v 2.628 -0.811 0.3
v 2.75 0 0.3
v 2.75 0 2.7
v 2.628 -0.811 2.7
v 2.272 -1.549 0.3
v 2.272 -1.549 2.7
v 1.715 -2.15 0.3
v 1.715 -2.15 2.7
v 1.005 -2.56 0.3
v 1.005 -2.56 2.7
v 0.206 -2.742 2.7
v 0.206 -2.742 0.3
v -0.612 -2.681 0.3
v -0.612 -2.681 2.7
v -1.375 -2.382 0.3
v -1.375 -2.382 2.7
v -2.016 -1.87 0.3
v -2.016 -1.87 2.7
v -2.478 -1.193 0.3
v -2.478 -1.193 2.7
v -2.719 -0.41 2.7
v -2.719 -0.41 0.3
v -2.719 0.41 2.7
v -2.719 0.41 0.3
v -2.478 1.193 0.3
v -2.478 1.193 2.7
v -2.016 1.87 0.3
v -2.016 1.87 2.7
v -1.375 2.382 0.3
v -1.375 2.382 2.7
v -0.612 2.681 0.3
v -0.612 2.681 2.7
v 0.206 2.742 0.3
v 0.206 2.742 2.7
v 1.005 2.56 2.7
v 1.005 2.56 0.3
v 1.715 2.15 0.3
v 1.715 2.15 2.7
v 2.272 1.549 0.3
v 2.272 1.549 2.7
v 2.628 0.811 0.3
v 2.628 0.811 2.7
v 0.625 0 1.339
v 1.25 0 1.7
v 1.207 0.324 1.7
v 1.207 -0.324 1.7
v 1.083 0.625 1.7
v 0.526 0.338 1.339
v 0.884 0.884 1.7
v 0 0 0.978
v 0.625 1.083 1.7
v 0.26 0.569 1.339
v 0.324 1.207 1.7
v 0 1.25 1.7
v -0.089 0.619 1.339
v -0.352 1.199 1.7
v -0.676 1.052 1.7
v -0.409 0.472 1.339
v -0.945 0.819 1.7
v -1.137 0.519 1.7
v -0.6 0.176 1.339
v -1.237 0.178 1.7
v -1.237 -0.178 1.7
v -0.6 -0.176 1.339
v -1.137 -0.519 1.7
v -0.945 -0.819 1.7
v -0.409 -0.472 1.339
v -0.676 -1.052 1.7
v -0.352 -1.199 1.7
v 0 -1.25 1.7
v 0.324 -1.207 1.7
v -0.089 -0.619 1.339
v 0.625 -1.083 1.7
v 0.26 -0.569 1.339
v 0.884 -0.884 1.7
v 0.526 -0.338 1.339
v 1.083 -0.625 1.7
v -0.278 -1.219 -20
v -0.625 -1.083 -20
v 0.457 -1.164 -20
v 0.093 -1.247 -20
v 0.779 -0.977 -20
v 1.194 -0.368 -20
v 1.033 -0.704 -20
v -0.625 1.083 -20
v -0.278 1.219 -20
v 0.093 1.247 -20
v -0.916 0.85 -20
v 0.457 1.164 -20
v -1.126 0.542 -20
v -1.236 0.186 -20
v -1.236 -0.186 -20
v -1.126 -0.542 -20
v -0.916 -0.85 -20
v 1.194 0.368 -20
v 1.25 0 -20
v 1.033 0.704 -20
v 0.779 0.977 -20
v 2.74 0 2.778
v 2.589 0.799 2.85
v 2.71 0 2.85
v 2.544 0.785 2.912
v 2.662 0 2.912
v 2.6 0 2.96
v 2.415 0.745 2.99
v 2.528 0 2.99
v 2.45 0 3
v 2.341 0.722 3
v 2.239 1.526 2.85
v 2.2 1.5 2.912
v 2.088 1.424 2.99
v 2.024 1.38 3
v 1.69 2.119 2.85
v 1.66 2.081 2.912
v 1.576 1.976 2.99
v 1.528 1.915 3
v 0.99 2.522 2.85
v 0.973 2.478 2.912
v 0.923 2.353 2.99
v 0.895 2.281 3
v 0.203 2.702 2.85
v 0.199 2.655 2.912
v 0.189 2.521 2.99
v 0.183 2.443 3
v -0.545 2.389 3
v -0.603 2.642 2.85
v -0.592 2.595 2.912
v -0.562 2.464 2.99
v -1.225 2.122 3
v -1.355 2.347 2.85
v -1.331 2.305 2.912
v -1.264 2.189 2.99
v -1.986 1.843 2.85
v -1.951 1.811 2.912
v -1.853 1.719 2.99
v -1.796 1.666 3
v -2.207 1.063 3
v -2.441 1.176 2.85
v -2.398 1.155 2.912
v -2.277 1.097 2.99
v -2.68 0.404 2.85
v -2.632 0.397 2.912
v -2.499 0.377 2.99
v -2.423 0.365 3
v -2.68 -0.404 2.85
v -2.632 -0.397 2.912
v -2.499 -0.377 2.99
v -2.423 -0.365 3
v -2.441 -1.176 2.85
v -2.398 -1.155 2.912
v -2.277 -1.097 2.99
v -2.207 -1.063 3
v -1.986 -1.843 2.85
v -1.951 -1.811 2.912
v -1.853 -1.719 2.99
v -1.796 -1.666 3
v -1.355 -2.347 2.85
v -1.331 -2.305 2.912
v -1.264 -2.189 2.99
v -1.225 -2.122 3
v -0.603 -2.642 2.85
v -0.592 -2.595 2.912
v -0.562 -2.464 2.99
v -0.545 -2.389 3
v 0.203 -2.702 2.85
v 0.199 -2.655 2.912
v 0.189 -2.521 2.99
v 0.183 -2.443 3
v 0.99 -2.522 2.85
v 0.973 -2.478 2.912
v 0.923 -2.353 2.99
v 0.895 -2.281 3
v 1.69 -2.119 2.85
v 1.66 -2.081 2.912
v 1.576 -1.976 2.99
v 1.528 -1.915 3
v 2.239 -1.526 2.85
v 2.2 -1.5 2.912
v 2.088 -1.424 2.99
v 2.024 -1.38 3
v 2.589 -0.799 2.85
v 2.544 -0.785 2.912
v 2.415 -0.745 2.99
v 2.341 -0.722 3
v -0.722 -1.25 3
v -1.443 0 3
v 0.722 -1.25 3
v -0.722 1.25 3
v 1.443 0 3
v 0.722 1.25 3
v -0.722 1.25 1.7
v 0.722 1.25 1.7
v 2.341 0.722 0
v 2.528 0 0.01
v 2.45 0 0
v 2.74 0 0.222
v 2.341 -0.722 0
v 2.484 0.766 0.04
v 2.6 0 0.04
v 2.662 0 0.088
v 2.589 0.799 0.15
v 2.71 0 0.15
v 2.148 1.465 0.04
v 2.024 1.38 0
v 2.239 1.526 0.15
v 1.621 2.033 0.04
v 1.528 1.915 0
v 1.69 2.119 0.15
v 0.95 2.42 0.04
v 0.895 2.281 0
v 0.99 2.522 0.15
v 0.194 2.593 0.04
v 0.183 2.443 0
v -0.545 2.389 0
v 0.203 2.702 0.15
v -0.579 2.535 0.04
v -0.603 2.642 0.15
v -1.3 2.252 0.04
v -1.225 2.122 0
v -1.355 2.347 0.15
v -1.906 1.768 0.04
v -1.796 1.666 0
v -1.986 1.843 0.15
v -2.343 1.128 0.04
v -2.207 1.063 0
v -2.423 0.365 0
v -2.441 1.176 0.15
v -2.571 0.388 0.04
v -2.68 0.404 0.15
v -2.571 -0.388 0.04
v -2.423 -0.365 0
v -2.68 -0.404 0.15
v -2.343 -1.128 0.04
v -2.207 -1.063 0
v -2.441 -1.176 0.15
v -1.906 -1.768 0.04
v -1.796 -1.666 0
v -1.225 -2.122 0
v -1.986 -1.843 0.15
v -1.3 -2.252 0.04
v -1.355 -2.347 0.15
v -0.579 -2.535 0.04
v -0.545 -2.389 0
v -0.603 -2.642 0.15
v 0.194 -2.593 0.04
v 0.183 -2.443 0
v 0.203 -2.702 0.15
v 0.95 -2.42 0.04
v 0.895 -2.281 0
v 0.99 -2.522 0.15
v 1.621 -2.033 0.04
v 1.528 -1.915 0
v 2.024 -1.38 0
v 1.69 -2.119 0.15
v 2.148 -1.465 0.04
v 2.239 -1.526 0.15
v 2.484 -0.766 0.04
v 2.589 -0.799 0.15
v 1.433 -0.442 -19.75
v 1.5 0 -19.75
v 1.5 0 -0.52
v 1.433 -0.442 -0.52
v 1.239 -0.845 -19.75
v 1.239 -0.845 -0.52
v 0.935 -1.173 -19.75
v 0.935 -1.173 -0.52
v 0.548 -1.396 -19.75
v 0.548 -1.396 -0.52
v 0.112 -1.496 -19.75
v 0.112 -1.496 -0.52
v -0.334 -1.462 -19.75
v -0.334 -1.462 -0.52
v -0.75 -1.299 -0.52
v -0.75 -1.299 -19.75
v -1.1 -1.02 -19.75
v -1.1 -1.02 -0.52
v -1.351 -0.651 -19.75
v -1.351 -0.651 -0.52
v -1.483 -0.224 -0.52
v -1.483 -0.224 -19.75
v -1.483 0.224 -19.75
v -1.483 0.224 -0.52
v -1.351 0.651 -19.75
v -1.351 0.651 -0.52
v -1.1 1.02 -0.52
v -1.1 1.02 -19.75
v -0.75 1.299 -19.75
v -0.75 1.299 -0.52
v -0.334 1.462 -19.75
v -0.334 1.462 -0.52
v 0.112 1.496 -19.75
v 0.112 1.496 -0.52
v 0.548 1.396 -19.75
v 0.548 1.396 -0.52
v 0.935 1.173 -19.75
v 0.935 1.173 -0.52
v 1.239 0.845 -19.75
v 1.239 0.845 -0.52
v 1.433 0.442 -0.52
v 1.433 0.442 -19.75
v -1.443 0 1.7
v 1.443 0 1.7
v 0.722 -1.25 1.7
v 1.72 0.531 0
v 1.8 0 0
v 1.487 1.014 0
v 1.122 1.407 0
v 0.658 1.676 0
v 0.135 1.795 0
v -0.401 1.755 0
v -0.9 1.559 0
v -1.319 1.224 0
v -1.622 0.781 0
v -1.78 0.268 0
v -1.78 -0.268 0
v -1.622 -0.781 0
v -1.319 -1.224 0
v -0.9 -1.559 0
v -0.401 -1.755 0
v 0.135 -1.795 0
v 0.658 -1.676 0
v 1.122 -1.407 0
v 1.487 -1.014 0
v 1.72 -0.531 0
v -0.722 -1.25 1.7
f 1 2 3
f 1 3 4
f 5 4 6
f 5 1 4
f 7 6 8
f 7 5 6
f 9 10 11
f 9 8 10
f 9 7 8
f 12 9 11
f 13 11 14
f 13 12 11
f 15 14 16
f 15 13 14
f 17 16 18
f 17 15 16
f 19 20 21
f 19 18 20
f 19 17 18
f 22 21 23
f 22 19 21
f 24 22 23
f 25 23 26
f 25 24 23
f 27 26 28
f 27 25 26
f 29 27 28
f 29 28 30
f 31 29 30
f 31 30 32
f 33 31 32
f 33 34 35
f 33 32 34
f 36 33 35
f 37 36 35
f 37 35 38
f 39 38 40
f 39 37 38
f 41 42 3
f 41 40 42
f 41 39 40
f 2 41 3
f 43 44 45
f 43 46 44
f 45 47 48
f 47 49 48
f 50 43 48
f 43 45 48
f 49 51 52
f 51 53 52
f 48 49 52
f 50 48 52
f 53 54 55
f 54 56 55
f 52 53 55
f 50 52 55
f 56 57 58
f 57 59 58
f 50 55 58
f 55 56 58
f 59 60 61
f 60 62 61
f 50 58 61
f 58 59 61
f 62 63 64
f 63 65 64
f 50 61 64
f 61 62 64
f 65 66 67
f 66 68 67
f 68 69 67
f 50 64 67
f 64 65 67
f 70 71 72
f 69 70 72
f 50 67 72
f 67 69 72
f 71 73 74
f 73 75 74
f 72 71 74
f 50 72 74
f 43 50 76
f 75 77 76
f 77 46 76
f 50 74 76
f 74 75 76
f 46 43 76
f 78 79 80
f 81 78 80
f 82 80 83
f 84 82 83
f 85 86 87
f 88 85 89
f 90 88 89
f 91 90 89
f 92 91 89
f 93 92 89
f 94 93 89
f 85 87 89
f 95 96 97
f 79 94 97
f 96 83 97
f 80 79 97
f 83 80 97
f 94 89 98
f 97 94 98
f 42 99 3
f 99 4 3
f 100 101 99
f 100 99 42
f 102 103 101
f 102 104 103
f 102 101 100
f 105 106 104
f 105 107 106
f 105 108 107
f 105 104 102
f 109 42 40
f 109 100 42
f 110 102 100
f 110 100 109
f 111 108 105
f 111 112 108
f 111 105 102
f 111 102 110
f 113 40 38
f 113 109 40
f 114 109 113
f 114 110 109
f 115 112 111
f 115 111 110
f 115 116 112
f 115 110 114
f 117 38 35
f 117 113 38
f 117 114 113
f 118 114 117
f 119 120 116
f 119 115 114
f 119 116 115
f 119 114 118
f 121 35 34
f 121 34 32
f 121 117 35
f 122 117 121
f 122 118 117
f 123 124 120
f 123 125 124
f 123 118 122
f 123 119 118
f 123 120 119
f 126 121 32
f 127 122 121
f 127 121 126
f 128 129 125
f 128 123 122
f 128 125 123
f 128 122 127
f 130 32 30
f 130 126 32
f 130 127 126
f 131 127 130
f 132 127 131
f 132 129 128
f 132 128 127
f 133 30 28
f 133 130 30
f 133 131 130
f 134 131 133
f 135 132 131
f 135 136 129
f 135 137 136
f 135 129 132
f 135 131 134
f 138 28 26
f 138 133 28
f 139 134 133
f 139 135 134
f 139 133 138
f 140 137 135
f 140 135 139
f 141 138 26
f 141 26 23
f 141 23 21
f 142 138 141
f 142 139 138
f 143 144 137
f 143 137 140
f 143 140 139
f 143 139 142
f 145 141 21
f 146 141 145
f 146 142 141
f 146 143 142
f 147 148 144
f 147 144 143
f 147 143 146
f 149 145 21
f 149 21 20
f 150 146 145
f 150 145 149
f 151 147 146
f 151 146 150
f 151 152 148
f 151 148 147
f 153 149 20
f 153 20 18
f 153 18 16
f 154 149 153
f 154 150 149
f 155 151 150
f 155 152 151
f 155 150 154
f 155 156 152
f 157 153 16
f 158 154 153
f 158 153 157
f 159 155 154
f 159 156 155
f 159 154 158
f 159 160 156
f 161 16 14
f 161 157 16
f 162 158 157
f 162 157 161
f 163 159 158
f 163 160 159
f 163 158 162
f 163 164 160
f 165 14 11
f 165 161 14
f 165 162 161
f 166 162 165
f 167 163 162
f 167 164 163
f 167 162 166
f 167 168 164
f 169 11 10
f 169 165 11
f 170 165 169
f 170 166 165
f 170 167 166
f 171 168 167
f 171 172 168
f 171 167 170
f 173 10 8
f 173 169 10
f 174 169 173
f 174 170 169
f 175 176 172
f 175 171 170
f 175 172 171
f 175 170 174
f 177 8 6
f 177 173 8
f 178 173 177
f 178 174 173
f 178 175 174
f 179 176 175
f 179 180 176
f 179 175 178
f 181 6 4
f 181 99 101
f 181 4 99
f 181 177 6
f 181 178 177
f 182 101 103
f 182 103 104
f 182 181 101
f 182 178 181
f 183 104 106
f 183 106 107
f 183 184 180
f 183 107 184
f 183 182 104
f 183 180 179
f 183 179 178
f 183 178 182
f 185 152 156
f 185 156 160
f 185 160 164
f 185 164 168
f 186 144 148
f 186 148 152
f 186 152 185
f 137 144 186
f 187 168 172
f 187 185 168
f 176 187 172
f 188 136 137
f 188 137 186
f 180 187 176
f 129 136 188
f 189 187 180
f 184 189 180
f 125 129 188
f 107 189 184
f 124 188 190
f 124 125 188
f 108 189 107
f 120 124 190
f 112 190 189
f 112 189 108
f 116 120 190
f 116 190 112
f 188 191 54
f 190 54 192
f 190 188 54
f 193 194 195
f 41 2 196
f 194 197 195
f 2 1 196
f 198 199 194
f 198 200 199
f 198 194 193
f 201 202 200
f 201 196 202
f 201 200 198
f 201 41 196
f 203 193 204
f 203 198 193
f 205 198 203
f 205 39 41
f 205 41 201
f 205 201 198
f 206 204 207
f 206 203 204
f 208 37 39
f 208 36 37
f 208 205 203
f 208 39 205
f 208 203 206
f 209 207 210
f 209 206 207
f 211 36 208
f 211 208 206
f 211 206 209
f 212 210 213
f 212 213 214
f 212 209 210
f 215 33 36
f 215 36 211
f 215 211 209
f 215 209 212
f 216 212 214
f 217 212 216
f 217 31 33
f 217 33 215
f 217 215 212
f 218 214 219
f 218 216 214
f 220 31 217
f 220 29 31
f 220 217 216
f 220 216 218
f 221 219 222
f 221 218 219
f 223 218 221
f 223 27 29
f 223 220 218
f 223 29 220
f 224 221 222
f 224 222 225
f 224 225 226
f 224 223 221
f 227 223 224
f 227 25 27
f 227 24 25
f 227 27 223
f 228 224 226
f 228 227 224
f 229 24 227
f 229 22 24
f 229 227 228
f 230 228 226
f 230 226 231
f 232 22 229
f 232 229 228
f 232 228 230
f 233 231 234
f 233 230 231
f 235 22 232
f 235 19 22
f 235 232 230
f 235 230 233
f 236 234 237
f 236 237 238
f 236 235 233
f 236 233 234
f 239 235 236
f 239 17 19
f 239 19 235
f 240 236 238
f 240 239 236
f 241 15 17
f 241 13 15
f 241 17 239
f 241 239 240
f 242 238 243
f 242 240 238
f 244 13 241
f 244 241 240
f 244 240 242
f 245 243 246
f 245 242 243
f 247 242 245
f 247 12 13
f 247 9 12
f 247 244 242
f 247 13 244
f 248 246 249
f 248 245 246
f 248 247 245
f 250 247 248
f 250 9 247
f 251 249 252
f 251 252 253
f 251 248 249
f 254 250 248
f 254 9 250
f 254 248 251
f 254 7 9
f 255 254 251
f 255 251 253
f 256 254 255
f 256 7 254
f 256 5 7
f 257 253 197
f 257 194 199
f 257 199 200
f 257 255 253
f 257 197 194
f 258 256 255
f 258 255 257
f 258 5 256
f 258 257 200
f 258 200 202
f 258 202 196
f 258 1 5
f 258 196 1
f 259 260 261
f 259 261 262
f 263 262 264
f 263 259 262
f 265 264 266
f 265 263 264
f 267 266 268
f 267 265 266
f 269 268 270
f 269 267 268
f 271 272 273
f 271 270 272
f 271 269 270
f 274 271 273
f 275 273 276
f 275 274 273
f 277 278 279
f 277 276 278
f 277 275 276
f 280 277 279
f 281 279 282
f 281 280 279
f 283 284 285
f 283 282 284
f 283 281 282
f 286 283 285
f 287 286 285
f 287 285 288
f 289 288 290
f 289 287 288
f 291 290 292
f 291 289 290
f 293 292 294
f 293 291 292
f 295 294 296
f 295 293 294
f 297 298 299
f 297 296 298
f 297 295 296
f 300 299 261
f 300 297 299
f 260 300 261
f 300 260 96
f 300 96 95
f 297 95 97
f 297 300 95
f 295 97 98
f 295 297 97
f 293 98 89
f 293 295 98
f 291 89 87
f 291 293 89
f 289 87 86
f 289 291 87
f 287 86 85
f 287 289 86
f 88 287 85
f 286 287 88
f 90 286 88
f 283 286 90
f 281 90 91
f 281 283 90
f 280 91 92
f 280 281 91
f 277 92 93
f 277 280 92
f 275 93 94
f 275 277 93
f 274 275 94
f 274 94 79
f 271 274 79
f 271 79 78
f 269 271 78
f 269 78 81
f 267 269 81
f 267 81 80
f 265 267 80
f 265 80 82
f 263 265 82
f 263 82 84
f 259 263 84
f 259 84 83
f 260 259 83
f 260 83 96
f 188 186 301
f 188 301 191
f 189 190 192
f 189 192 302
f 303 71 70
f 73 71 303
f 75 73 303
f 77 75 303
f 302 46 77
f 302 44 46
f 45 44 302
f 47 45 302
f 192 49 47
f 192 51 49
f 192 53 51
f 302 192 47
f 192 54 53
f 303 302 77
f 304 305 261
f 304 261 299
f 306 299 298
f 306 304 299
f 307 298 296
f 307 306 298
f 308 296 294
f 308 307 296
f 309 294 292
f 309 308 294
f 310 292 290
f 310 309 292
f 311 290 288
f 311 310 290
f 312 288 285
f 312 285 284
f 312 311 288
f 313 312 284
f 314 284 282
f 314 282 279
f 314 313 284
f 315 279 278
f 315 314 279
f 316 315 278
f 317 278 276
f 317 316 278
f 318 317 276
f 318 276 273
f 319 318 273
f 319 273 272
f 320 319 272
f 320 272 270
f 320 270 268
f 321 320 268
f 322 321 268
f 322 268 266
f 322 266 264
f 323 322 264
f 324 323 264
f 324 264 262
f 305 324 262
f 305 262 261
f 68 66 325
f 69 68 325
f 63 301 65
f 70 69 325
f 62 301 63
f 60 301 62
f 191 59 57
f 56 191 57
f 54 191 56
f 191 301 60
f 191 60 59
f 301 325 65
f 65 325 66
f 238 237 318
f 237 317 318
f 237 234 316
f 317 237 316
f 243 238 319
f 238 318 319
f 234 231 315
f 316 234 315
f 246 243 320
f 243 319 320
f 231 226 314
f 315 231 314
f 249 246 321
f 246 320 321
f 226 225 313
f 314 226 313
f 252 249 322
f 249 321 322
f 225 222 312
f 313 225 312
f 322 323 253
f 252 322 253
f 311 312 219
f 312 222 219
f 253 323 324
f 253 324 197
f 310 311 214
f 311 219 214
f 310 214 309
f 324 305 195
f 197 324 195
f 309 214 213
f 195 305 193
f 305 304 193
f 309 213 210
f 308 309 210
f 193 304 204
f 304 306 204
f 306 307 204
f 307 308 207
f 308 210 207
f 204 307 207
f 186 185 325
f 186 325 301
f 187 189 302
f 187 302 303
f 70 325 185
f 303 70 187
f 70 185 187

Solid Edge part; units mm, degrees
sketch "Sketch1" plane through (0, 0, 0) normal (0, -1, 0) x (1, 0, 0)
  line L0 (2.75, 3) -> (2.75, 0)
  line L1 (2.75, 0) -> (1.8, 0)
  line L2 (1.8, 0) -> (1.5, -0.5196)
  line L3 (1.5, -0.5196) -> (1.5, -20)
  line L4 (1.5, -20) -> (0, -20)
  line L5 (1.25, 1.7) -> (0, 0.9783)
  line L6 (1.25, 3) -> (1.25, 1.7)
  line L7 (2.75, 3) -> (1.25, 3)
  dimension "D1" = 1.3
  dimension "D2" = 20
  dimension "D3" = 3
revolve "RevolvedProtrusion1" add sketch "Sketch1" angle 360 about axis through (0, 0, -6) along (0, 0, 1)
cosmetic_thread "Thread1" size "M3"
chamfer "Chamfer_1" distance 0.25 angle 45 1 edges at (-1.5, 0, -20)
fillet "Round_1" radius 0.3 2 edges at (-2.75, 0, 0) (-2.75, 0, 3)
sketch "Sketch2" plane through (0, 0, 3) normal (0, 0, 1) x (0, 1, 0)
  line L0 (-1.25, 0.7217) -> (-1.25, -0.7217)
  line L1 (0, -1.4434) -> (-1.25, -0.7217)
  line L2 (1.25, -0.7217) -> (0, -1.4434)
  line L3 (1.25, 0.7217) -> (1.25, -0.7217)
  line L4 (0, 1.4434) -> (1.25, 0.7217)
  line L5 (-1.25, 0.7217) -> (0, 1.4434)
extrude "Cutout1" cut sketch "Sketch2" against normal up to vertex (1.3 mm away)
properties material "Galvanized steel"
